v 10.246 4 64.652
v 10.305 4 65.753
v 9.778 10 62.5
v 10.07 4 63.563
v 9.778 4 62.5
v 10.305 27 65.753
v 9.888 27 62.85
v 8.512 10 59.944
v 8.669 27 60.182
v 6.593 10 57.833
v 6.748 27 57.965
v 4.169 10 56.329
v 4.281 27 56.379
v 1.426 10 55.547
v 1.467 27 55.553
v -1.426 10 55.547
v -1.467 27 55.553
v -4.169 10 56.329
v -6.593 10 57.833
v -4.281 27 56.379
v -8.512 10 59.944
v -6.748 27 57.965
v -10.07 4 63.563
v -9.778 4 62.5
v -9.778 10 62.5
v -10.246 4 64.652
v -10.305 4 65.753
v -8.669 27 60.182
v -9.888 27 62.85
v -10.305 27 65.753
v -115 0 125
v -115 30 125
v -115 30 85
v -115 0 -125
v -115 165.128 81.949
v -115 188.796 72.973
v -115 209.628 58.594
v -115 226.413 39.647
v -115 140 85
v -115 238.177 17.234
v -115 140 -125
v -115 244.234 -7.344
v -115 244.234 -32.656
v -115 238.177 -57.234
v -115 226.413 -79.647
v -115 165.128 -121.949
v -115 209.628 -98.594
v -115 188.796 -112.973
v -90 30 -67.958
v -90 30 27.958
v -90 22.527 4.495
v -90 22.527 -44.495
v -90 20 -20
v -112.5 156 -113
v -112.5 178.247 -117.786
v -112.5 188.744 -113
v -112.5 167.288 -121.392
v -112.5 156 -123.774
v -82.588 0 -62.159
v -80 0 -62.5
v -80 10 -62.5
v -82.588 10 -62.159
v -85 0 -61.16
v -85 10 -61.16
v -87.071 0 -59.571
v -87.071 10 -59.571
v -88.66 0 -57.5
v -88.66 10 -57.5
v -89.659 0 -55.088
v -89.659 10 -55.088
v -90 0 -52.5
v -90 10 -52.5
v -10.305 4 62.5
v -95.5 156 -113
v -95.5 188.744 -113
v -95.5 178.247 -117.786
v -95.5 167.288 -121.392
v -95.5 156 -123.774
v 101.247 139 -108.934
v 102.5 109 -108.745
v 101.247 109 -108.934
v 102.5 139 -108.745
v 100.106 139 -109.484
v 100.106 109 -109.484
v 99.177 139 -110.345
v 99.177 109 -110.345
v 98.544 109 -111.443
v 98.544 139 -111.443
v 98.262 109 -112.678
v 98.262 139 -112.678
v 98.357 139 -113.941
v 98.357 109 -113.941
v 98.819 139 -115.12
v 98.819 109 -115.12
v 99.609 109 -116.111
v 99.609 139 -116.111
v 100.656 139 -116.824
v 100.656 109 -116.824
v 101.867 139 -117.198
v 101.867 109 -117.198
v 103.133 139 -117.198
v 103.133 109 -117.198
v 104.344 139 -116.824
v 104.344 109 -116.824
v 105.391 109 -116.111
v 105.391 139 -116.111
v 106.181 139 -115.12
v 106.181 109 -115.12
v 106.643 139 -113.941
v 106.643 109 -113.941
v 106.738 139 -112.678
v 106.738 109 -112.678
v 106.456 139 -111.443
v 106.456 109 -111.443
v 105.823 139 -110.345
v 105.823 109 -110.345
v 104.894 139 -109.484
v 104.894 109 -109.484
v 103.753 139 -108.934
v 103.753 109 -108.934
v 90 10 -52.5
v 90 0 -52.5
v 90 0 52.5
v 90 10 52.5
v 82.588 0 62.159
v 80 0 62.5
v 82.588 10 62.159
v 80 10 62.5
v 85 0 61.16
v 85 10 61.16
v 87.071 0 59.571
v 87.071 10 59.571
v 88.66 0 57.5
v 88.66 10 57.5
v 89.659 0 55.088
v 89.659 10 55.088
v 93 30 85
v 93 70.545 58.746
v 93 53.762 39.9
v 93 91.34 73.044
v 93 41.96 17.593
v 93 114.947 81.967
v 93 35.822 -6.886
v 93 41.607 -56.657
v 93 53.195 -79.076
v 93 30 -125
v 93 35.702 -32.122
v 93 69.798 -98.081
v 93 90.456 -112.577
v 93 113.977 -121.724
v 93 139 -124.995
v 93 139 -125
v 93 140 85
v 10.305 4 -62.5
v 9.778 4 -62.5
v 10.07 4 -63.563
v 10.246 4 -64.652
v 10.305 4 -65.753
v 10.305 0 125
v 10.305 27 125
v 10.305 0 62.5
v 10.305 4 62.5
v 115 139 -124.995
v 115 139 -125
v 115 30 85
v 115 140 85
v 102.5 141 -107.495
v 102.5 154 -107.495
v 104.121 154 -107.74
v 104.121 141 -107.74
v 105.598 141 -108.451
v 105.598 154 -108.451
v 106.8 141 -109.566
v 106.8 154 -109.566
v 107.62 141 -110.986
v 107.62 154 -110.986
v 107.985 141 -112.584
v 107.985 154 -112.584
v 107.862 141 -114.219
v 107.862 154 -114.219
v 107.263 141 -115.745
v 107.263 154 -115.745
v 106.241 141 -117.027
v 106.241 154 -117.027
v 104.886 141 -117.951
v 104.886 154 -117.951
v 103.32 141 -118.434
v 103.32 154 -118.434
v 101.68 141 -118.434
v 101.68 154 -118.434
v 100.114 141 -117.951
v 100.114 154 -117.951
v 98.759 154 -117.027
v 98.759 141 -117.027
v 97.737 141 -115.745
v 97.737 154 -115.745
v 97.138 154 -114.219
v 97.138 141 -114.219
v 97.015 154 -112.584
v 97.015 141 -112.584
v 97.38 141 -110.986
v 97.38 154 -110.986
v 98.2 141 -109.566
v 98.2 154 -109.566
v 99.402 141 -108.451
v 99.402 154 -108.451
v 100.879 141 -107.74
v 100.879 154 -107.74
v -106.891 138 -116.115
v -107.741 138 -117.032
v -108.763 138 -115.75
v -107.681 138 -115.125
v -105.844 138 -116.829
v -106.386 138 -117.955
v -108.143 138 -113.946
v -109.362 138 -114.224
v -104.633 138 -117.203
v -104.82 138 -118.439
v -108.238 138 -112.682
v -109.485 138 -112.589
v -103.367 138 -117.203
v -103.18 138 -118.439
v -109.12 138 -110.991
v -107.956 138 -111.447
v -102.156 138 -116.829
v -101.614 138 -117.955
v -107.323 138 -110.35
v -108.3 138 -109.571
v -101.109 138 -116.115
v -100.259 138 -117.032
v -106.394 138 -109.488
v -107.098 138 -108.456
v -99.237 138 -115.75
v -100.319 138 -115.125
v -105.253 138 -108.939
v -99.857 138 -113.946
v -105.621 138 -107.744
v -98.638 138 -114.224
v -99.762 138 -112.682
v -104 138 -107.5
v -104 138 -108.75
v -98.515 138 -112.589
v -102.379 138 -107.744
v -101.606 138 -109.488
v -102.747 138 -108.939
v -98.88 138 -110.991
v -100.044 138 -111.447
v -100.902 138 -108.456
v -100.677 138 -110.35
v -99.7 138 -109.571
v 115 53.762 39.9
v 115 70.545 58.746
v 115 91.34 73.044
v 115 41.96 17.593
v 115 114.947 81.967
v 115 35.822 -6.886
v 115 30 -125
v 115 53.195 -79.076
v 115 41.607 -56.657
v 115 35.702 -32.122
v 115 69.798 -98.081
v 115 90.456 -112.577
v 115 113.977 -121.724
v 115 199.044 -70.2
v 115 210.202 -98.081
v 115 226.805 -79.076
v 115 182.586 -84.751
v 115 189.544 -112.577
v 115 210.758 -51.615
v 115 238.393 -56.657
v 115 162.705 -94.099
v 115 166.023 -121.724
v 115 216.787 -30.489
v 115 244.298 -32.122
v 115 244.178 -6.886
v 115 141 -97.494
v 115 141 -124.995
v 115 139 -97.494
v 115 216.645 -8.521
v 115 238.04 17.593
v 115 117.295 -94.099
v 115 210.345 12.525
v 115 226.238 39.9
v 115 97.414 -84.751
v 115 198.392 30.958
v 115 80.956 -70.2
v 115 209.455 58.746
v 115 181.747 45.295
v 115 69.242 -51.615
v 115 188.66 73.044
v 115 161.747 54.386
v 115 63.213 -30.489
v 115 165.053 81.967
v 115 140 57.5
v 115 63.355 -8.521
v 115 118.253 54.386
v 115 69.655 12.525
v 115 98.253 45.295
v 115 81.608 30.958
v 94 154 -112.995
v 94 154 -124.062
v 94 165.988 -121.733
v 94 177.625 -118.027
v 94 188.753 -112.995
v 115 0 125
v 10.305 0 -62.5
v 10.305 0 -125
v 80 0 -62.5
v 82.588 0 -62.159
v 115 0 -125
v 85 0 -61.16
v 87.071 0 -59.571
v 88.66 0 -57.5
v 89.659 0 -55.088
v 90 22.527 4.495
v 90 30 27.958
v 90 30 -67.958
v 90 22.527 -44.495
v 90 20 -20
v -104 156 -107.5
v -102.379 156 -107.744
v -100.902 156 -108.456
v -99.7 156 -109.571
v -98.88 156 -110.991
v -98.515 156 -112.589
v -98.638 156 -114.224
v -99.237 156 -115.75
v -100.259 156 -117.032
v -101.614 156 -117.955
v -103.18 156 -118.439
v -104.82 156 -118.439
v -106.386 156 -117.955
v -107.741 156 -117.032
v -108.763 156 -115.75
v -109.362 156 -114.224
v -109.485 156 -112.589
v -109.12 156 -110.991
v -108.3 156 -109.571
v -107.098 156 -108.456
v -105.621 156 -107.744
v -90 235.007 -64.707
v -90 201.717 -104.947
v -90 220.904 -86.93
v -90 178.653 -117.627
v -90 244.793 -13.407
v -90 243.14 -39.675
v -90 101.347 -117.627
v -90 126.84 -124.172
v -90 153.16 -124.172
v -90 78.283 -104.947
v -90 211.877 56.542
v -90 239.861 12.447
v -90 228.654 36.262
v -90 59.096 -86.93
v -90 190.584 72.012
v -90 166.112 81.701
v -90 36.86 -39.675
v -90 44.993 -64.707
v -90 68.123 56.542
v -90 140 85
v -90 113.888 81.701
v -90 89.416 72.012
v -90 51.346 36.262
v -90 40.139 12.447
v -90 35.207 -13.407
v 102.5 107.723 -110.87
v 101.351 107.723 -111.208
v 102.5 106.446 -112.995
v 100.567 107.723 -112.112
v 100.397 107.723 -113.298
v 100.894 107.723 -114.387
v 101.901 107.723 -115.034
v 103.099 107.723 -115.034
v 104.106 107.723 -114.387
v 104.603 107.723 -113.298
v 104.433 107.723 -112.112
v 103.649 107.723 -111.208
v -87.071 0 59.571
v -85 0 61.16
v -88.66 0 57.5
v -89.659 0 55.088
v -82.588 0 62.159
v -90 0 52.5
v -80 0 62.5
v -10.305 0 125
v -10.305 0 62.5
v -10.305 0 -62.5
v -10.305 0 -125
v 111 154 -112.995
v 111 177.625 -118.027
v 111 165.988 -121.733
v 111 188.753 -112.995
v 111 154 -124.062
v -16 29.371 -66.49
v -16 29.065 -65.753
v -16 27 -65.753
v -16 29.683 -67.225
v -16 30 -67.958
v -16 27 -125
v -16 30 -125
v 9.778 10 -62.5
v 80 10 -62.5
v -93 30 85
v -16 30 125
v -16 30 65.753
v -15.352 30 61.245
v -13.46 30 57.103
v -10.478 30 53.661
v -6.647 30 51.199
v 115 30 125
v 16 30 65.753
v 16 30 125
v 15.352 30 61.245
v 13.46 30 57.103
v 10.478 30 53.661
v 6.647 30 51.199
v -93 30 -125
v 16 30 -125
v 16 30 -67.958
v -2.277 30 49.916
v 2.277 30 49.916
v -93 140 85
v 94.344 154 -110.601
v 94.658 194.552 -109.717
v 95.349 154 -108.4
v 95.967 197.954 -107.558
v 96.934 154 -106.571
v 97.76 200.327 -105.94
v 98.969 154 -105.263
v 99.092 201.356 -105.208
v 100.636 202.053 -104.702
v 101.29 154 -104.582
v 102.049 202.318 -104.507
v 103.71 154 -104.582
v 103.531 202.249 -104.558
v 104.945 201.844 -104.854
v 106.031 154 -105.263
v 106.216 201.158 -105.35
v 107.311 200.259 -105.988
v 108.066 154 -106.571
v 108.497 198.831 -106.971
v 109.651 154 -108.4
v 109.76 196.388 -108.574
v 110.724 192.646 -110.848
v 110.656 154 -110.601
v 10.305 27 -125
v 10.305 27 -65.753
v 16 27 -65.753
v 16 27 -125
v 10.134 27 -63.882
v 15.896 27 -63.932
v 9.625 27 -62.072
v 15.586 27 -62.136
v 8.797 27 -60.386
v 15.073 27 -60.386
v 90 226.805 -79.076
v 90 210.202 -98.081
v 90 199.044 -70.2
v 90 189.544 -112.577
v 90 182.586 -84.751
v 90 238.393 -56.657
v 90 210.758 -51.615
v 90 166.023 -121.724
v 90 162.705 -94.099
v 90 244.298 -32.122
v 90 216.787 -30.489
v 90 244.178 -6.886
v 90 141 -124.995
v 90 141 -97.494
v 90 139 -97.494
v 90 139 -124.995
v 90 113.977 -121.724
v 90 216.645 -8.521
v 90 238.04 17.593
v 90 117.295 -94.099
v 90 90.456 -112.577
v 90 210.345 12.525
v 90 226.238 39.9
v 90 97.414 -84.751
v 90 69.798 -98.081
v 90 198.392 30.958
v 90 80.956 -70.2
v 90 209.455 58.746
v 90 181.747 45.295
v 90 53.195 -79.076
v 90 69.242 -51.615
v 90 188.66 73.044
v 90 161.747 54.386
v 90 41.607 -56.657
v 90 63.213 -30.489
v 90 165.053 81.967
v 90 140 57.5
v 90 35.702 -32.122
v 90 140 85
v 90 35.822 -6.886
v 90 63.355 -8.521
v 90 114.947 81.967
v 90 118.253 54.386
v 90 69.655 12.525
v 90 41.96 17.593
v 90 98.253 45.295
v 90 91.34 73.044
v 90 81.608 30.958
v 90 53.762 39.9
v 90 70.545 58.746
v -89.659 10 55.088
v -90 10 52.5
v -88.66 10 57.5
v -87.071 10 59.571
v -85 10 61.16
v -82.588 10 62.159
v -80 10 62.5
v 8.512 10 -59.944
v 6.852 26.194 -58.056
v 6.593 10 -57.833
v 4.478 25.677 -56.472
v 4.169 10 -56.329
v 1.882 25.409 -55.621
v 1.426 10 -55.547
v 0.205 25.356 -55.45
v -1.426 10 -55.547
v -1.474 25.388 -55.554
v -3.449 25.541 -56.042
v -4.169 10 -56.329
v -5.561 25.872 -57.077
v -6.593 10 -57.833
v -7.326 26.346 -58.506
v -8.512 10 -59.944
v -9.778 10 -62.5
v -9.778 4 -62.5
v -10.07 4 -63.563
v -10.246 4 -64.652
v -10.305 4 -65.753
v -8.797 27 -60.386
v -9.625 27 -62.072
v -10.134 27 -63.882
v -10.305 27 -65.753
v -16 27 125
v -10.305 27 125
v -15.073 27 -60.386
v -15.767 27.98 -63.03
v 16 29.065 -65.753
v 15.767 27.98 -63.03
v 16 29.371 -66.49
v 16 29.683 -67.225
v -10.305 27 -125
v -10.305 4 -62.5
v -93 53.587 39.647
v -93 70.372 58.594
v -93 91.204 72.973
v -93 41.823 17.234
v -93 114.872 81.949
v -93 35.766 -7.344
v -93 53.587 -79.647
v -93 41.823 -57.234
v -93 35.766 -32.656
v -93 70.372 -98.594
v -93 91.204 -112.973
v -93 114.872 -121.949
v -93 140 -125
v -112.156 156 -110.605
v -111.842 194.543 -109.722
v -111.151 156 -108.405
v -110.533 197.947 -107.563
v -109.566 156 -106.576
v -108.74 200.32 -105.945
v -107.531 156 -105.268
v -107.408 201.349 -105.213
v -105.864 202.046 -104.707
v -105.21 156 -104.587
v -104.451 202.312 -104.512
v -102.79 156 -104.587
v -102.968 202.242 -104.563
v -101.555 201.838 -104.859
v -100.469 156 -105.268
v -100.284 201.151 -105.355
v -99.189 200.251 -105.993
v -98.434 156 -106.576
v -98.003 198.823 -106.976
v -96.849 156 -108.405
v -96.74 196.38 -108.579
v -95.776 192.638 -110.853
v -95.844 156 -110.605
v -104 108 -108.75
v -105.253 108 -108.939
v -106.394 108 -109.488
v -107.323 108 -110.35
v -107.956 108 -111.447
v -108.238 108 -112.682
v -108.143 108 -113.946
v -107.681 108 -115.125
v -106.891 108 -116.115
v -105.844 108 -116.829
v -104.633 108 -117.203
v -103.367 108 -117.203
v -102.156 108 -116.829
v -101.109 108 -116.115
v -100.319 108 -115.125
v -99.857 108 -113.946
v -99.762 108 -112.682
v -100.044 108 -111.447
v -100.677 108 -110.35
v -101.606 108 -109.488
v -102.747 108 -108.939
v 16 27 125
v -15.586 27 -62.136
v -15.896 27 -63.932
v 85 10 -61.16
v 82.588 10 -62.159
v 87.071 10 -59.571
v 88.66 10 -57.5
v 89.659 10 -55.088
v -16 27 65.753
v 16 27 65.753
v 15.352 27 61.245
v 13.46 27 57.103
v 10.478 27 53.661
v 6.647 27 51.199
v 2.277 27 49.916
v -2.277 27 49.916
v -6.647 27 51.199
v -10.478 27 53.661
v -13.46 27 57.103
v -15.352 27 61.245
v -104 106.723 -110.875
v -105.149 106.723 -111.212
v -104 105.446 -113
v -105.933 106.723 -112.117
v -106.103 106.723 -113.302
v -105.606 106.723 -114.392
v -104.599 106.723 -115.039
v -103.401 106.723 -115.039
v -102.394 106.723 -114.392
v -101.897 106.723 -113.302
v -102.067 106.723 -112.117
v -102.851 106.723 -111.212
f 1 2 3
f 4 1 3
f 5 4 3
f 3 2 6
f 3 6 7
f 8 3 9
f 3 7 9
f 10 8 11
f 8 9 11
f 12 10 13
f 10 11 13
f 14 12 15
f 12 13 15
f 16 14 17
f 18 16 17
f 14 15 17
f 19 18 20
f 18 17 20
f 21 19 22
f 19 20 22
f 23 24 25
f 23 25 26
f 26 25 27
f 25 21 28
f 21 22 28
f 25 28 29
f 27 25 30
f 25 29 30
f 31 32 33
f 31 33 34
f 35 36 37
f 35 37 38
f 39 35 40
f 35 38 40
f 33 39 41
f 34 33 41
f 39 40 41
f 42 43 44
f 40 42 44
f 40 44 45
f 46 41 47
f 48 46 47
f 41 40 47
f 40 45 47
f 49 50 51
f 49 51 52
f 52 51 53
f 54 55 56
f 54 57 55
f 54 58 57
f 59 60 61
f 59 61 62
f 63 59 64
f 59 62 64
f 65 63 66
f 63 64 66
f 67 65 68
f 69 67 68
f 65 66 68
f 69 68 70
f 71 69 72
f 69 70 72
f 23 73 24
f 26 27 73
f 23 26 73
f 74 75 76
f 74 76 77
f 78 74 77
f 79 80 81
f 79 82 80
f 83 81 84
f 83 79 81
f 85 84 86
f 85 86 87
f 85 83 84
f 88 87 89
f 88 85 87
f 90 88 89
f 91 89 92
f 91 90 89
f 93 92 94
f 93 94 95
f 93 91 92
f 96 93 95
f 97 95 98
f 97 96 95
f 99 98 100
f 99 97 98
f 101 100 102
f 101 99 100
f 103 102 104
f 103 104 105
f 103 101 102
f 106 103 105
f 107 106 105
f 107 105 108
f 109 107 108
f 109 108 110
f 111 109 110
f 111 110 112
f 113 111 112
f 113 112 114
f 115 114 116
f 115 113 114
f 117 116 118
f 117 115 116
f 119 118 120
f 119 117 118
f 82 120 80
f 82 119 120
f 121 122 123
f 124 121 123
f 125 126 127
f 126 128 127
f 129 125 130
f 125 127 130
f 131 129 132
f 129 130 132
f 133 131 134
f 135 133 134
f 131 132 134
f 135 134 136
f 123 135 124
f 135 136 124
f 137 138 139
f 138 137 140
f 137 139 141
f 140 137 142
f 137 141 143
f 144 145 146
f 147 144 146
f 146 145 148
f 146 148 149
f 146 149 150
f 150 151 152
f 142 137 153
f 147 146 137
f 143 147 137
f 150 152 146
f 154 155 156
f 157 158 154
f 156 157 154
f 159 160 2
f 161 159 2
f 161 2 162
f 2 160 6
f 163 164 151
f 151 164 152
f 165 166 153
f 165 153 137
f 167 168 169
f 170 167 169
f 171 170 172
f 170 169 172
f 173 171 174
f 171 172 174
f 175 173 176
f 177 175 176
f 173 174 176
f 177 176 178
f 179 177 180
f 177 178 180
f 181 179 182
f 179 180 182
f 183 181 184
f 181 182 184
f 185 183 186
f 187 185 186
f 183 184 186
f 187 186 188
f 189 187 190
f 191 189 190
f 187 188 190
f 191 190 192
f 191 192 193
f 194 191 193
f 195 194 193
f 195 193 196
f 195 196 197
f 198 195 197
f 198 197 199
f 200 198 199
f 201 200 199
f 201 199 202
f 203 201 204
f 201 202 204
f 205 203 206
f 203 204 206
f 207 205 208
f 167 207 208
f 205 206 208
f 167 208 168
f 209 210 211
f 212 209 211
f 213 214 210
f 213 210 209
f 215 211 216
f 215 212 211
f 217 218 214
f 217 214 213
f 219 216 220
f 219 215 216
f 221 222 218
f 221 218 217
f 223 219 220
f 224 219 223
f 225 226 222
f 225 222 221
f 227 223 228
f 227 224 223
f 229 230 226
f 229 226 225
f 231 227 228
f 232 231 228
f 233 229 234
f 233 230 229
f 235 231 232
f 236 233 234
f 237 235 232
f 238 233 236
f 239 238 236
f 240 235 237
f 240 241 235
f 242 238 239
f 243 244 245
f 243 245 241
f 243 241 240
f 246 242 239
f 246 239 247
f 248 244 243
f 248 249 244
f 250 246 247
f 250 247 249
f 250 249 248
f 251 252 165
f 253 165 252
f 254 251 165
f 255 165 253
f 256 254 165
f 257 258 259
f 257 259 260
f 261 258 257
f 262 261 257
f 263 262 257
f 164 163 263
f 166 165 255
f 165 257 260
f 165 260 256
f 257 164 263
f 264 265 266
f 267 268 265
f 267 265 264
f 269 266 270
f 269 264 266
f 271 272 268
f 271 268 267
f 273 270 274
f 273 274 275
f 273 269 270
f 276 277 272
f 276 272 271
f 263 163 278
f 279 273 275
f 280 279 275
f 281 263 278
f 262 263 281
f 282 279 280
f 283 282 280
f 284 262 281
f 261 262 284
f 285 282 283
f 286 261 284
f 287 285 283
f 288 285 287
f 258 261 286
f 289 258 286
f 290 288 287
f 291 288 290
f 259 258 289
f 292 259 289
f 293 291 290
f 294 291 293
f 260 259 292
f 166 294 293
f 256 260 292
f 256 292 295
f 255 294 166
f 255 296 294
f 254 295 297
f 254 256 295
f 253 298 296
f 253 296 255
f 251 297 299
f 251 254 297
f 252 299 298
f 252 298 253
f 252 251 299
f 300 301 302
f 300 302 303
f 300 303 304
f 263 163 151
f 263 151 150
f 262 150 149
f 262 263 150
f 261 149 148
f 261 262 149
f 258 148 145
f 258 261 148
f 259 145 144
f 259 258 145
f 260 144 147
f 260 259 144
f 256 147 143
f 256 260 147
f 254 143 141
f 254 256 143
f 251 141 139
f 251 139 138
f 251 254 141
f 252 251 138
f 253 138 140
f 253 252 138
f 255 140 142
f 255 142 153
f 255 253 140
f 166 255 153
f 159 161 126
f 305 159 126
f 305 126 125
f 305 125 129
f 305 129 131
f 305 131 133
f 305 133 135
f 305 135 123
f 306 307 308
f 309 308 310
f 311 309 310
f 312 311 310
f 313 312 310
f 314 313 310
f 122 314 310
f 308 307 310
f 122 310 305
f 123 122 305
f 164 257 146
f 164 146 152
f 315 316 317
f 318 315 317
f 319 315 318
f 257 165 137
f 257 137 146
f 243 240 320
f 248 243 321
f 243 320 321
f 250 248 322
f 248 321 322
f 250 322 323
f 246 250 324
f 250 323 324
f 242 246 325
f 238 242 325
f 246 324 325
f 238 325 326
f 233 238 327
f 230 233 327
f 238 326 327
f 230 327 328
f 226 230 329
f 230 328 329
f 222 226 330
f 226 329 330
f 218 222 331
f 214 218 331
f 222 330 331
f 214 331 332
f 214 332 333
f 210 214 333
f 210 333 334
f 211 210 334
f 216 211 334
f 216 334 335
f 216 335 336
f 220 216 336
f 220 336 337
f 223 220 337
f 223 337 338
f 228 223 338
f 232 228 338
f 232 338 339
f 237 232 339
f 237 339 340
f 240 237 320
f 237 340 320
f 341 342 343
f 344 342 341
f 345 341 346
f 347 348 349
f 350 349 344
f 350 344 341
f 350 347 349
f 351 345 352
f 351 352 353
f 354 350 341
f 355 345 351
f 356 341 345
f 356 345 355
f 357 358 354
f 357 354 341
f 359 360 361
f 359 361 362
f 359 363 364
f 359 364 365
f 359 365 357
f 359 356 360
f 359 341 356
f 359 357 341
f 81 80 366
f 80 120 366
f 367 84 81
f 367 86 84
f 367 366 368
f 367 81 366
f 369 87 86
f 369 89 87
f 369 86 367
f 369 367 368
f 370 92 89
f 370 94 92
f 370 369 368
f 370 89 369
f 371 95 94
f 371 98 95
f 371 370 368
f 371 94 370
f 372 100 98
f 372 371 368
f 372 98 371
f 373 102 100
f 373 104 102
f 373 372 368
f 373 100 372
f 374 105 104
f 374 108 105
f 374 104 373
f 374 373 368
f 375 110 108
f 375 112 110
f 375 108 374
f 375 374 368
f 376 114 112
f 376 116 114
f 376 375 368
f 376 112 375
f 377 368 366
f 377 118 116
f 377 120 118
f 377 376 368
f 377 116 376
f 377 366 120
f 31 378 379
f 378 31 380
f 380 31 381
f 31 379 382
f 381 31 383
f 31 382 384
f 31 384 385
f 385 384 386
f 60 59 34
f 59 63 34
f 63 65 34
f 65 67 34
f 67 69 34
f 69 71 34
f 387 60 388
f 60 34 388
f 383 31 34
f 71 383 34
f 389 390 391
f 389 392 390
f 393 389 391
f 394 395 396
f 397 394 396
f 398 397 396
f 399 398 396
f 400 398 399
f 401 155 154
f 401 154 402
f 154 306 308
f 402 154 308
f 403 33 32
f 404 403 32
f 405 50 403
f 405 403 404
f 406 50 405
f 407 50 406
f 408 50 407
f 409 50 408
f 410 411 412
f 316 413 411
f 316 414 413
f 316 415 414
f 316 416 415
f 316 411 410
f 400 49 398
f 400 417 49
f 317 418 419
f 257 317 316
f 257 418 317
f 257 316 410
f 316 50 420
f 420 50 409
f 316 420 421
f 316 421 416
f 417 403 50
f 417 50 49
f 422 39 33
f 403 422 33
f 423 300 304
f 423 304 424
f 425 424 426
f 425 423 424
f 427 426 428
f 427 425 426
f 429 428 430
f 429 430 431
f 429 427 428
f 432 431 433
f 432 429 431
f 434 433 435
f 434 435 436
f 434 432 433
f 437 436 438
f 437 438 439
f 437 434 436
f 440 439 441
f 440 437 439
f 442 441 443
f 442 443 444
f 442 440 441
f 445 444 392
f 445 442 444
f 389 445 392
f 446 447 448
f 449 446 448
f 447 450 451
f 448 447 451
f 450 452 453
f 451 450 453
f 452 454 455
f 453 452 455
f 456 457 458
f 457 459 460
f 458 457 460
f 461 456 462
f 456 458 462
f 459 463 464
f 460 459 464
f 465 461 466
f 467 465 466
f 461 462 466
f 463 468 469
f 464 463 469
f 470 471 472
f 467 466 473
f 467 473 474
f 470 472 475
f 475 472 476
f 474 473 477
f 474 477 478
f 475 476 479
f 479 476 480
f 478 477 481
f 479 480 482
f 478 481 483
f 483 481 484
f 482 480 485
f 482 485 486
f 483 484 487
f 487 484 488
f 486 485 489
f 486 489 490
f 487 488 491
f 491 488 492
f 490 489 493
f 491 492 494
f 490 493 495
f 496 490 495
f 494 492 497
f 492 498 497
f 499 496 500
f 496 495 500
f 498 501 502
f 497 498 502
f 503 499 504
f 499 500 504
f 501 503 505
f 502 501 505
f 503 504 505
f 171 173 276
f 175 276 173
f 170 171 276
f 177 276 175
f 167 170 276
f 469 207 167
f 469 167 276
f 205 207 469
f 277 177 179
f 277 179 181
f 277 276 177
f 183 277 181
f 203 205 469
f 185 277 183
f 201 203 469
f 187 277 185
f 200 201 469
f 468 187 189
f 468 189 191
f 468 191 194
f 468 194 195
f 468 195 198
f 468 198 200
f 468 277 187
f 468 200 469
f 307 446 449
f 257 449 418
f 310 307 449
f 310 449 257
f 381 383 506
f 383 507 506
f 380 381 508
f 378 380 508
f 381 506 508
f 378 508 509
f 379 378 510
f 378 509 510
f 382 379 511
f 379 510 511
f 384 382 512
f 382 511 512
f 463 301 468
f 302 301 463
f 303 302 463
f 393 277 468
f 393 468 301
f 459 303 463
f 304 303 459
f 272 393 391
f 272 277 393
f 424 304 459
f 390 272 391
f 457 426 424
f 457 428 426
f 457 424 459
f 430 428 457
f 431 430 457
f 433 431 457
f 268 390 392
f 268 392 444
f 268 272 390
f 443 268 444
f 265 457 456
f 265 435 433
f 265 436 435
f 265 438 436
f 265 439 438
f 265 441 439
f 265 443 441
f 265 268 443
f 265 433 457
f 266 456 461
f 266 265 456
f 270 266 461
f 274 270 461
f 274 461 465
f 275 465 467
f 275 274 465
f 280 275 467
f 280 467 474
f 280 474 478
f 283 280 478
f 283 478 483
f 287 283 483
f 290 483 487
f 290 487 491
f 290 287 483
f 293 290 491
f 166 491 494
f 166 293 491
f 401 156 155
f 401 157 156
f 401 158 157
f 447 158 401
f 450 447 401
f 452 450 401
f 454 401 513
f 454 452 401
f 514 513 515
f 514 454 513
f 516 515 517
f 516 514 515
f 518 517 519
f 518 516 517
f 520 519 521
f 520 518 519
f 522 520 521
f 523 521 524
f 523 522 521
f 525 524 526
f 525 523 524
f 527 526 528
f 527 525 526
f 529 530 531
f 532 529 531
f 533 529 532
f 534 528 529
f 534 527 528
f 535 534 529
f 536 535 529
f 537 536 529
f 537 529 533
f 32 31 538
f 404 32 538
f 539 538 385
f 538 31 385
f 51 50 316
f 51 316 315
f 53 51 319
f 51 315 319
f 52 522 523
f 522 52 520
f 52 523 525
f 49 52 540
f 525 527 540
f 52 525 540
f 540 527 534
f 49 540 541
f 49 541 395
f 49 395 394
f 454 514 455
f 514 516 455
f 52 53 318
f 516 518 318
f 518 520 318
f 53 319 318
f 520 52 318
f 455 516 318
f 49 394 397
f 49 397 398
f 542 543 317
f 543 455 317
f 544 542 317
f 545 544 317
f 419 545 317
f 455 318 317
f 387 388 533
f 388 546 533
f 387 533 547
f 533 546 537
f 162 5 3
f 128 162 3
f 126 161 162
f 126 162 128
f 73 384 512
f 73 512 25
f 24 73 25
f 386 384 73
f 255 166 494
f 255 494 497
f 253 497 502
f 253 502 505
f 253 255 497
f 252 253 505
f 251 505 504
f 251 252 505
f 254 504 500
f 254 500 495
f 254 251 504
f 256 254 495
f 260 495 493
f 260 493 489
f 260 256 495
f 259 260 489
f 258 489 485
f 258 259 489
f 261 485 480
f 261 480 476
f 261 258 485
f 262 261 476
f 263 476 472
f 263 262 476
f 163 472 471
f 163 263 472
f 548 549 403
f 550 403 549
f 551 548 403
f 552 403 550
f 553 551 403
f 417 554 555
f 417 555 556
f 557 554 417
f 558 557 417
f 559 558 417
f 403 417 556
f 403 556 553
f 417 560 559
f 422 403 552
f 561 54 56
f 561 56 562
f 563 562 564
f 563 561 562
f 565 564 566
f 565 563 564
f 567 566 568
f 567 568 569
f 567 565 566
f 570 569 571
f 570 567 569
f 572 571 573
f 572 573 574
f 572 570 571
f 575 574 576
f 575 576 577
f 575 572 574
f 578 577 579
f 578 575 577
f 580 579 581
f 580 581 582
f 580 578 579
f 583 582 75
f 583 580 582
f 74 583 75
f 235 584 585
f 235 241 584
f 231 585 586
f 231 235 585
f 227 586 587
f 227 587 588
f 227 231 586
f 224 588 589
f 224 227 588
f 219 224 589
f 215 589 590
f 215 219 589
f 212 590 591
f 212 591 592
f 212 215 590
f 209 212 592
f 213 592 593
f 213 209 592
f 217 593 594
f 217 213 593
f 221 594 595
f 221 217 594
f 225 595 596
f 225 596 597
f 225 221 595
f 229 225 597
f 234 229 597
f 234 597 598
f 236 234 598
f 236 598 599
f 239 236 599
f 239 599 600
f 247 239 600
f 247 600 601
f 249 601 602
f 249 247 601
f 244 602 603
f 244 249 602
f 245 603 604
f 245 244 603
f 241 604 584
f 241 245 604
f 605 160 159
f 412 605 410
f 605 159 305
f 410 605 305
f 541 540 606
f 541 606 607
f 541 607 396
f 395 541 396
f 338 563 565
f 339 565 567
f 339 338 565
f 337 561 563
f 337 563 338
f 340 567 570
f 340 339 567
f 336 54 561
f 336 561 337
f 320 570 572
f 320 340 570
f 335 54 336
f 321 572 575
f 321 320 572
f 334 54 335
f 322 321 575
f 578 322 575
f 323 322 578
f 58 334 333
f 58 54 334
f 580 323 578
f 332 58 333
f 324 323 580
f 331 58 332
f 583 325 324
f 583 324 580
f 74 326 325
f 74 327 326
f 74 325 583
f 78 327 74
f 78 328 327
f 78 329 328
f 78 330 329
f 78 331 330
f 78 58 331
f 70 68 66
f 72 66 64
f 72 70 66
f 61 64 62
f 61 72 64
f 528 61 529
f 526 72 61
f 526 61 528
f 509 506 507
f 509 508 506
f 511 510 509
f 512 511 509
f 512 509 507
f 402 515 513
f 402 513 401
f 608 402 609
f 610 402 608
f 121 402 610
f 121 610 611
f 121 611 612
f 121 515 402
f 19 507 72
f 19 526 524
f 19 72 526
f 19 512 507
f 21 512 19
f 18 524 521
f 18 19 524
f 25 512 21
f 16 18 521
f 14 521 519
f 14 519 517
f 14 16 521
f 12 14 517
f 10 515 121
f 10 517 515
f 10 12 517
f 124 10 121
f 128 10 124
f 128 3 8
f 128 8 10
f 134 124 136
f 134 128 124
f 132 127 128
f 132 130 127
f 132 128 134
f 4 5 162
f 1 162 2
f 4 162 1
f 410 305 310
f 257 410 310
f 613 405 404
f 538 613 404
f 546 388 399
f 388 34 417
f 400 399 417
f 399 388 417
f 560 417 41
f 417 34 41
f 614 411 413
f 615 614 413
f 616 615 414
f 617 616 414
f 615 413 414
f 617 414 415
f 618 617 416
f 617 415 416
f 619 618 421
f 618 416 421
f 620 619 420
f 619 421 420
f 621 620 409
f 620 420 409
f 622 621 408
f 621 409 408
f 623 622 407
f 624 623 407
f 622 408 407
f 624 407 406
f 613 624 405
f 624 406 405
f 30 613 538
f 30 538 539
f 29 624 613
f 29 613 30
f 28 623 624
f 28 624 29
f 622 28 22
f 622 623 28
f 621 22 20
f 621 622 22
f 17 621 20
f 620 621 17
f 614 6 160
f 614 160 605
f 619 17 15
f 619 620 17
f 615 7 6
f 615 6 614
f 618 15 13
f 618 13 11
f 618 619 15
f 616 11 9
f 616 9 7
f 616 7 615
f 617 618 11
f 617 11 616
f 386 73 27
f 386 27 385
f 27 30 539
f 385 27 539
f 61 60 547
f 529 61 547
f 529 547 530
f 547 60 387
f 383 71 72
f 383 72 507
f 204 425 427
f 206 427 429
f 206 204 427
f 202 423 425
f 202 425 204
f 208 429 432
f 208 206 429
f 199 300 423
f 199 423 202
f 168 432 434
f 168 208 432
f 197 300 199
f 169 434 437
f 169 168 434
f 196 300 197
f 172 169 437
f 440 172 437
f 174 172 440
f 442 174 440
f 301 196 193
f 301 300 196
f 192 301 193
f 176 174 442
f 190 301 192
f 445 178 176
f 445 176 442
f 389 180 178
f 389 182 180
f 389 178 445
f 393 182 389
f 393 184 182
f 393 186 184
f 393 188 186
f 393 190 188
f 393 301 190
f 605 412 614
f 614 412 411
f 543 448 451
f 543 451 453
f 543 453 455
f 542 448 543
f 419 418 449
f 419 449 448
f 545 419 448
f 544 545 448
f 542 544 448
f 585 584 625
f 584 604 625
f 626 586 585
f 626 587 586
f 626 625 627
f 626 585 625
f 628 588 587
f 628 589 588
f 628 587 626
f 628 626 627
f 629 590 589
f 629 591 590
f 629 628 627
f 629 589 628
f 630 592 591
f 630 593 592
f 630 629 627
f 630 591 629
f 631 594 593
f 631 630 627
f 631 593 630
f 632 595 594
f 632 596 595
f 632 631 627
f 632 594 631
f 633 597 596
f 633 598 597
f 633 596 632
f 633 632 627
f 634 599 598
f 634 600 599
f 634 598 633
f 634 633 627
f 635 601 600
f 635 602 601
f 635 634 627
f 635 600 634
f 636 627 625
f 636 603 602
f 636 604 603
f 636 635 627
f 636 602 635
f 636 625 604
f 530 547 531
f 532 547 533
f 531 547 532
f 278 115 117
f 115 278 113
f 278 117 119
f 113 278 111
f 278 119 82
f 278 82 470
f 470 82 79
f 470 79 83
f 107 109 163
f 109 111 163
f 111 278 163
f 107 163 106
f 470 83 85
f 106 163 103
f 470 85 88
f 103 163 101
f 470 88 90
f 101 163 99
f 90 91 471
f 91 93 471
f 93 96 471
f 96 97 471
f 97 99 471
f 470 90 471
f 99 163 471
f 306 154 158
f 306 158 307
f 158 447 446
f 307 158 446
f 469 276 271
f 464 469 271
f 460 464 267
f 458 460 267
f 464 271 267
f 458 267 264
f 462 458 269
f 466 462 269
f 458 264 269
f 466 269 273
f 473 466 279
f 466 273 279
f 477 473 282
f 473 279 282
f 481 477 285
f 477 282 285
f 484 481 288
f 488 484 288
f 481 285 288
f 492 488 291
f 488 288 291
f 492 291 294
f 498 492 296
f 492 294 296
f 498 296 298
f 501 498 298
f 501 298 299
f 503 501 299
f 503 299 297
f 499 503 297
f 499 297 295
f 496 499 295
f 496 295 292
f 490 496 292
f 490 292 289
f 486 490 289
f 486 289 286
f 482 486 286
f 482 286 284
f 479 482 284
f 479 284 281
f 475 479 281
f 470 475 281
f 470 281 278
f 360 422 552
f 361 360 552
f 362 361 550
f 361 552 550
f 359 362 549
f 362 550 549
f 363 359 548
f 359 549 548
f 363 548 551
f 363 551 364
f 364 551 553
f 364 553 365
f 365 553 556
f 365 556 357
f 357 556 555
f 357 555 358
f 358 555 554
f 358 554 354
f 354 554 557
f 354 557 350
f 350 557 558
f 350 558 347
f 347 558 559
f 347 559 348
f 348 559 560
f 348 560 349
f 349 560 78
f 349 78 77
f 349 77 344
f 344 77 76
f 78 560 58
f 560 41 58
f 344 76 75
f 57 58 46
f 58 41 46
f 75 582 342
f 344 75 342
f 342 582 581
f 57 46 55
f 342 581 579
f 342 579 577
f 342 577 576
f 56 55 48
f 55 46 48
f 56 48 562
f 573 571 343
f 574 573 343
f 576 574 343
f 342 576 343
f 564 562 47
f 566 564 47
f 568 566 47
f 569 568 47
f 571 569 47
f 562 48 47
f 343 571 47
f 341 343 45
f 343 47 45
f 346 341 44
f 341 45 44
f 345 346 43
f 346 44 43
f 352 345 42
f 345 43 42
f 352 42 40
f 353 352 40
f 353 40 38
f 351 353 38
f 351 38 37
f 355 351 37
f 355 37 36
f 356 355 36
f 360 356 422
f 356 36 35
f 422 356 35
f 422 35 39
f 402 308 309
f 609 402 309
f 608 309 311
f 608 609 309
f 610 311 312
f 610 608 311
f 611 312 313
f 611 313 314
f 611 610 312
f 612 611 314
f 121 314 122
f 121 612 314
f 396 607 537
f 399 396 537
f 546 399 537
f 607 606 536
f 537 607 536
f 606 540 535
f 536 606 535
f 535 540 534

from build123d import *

# Parameters (mm, degrees)
SKETCH_3_W           = 230
SKETCH_3_H           = 250
EXTRUDE_1_DEPTH      = 30
CUT_EXTRUDE_1_DEPTH  = 30
CUT_EXTRUDE_2_DEPTH  = 3
CUT_EXTRUDE_START    = -30
SKETCH_5_W           = 20.61
SKETCH_5_H           = 131.50590542
CUT_EXTRUDE_3_DEPTH  = 4
EXTRUDE_START        = 115
SKETCH_6_R           = 105
EXTRUDE_2_DEPTH      = 25
EXTRUDE_START_2      = -115
SKETCH_6_5_R         = 105
EXTRUDE_3_DEPTH      = 25
EXTRUDE_4_DEPTH      = 22
EXTRUDE_5_DEPTH      = 22
SKETCH_10_R          = 120
CUT_EXTRUDE_10_DEPTH = 90
SKETCH_11_R          = 77.5
CUT_EXTRUDE_11_DEPTH = 25
SKETCH_12_W          = 57.586141253
SKETCH_12_H          = 168.151532458
CUT_EXTRUDE_12_DEPTH = 1
CUT_EXTRUDE_START_2  = 156
SKETCH_13_R          = 8.5
CUT_EXTRUDE_13_DEPTH = 143.119103715
SKETCH_14_R          = 5.5
CUT_EXTRUDE_14_DEPTH = 18
CUT_EXTRUDE_START_3  = 154
SKETCH_15_R          = 8.5
CUT_EXTRUDE_15_DEPTH = 145.119103878
SKETCH_16_R          = 5.5
CUT_EXTRUDE_16_DEPTH = 13
SKETCH_21_W          = 180
SKETCH_21_H          = 125
CUT_EXTRUDE_17_DEPTH = 10
FILLET_1_R           = 10


with BuildPart() as part:
    # 草图3 → 凸台-拉伸1 (new body)
    with BuildSketch(Plane(origin=(0, 0, 0), x_dir=(1, 0, 0), z_dir=(0, 1, 0))):
        Rectangle(SKETCH_3_W, SKETCH_3_H)
    extrude(amount=EXTRUDE_1_DEPTH)

    # 草图4 → 切除-拉伸1 (cut)
    with BuildSketch(Plane(origin=(0, 30, 0), x_dir=(1, 0, 0), z_dir=(0, 1, 0))):
        with BuildLine():
            Line((-10.305, -65.75295271), (-10.305, -125))
            Line((-10.305, -125), (10.305, -125))
            Line((10.305, -125), (10.305, -65.75295271))
            ThreePointArc((10.305, -65.75295271), (0, -55.44795271), (-10.305, -65.75295271))
        make_face()
    cut_extrude_1 = extrude(amount=-CUT_EXTRUDE_1_DEPTH, mode=Mode.SUBTRACT)

    # 草图4<3> → 切除-拉伸2 (cut)
    with BuildSketch(Plane(origin=(0, 30, 0), x_dir=(1, 0, 0), z_dir=(0, 1, 0))):
        with BuildLine():
            ThreePointArc((16, -65.75295271), (0, -49.75295271), (-16, -65.75295271))
            Line((-16, -65.75295271), (-16, -125))
            Line((-16, -125), (-10.305, -125))
            Line((-10.305, -125), (-10.305, -65.75295271))
            ThreePointArc((-10.305, -65.75295271), (0, -55.44795271), (10.305, -65.75295271))
            Line((10.305, -65.75295271), (10.305, -125))
            Line((10.305, -125), (16, -125))
            Line((16, -125), (16, -65.75295271))
        make_face()
    cut_extrude_2 = extrude(amount=-CUT_EXTRUDE_2_DEPTH, mode=Mode.SUBTRACT)

    # 镜向1: 切除-拉伸1, 切除-拉伸2 across plane
    add(cut_extrude_1.mirror(Plane.XY), mode=Mode.SUBTRACT)
    add(cut_extrude_2.mirror(Plane.XY), mode=Mode.SUBTRACT)

    # 草图5 → 切除-拉伸3 (cut)
    with BuildSketch(Plane(origin=(0, 30, 0), x_dir=(1, 0, 0), z_dir=(0, 1, 0)).offset(CUT_EXTRUDE_START)):
        Rectangle(SKETCH_5_W, SKETCH_5_H)
    extrude(amount=CUT_EXTRUDE_3_DEPTH, mode=Mode.SUBTRACT)



with BuildPart() as body_2:
    # 草图6 → 凸台-拉伸2 (new body)
    with BuildSketch(Plane(origin=(0, 0, 0), x_dir=(0, 0, -1), z_dir=(1, 0, 0)).offset(EXTRUDE_START)):
        with Locations(Location((20, 140, 0), (0, 0, 180))):
            Circle(SKETCH_6_R)
    extrude(amount=-EXTRUDE_2_DEPTH)

    # 草图11 → 切除-拉伸11 (cut)
    with BuildSketch(Plane(origin=(115, 0, 0), x_dir=(0, 0, -1), z_dir=(1, 0, 0))):
        with Locations((20, 140)):
            Circle(SKETCH_11_R)
    extrude(amount=-CUT_EXTRUDE_11_DEPTH, mode=Mode.SUBTRACT)


with BuildPart() as body_3:
    # 草图6<5> → 凸台-拉伸3 (new body)
    with BuildSketch(Plane(origin=(0, 0, 0), x_dir=(0, 0, -1), z_dir=(1, 0, 0)).offset(EXTRUDE_START_2)):
        with Locations(Location((20, 140, 0), (0, 0, 180))):
            Circle(SKETCH_6_5_R)
    extrude(amount=EXTRUDE_3_DEPTH)


with BuildPart() as body_4:
    # 草图6<8> → 凸台-拉伸4 (new body)
    with BuildSketch(Plane(origin=(0, 0, 0), x_dir=(0, 0, -1), z_dir=(1, 0, 0)).offset(EXTRUDE_START)):
        with BuildLine():
            Line((-85, 30), (125, 30))
            Line((125, 30), (125, 140))
            ThreePointArc((125, 140), (20, 35), (-85, 140))
            Line((-85, 140), (-85, 30))
        make_face()
    extrude(amount=-EXTRUDE_4_DEPTH)


with BuildPart() as part_1:
    add(part.part)

    add(body_3.part)  # 凸台-拉伸5 merges body 3
    # 草图6<10> → 凸台-拉伸5 (add)
    with BuildSketch(Plane(origin=(0, 0, 0), x_dir=(0, 0, -1), z_dir=(1, 0, 0)).offset(EXTRUDE_START_2)):
        with BuildLine():
            Line((-85, 30), (125, 30))
            Line((125, 30), (125, 140))
            ThreePointArc((125, 140), (20, 35), (-85, 140))
            Line((-85, 140), (-85, 30))
        make_face()
    extrude(amount=EXTRUDE_5_DEPTH)

    # 草图10 → 切除-拉伸10 (cut, symmetric)
    with BuildSketch(Plane(origin=(0, 0, 0), x_dir=(0, 0, -1), z_dir=(1, 0, 0))):
        with Locations((20, 140)):
            Circle(SKETCH_10_R)
    extrude(amount=CUT_EXTRUDE_10_DEPTH, both=True, mode=Mode.SUBTRACT)

    # 草图13 → 切除-拉伸13 (cut, through all)
    with BuildSketch(Plane(origin=(0, 0, 0), x_dir=(1, 0, 0), z_dir=(0, 1, 0)).offset(CUT_EXTRUDE_START_2)):
        with BuildLine():
            Line((-112.5, 138.339436781), (-112.5, 113))
            ThreePointArc((-112.5, 113), (-104, 121.5), (-95.5, 113))
            Line((-95.5, 113), (-95.5, 138.339436781))
            Line((-95.5, 138.339436781), (-112.5, 138.339436781))
        make_face()
        with Locations((-104, 113)):
            Circle(SKETCH_13_R)
    extrude(amount=CUT_EXTRUDE_13_DEPTH, mode=Mode.SUBTRACT)

    # 草图14 → 切除-拉伸14 (cut)
    with BuildSketch(Plane(origin=(0, 156, 0), x_dir=(1, 0, 0), z_dir=(0, 1, 0))):
        with Locations(Location((-104, 113, 0), (0, 0, 270))):
            Circle(SKETCH_14_R)
    extrude(amount=-CUT_EXTRUDE_14_DEPTH, mode=Mode.SUBTRACT)

    # 草图18 → M10 螺纹孔1 (revolve, cut)
    with BuildSketch(Plane(origin=(-104, 138, -113), x_dir=(0, 0, 1), z_dir=(1, 0, 0))):
        Polygon((0, 0), (0, 32.553657631), (4.25, 30), (4.25, 0), align=None)
    revolve(axis=Axis((-104, 144.35, -113), (0, -1, 0)), mode=Mode.SUBTRACT)

    # 草图21 → 切除-拉伸17 (cut)
    with BuildSketch(Plane.XZ):
        Rectangle(SKETCH_21_W, SKETCH_21_H)
    extrude(amount=-CUT_EXTRUDE_17_DEPTH, mode=Mode.SUBTRACT)

    # 圆角1
    fillet_1_edges = [part_1.edges().sort_by_distance(p)[0] for p in [
        (-90, 5, 62.5),
        (90, 5, -62.5),
        (-90, 5, -62.5),
        (90, 5, 62.5),
    ]]
    fillet(fillet_1_edges, radius=FILLET_1_R)


with BuildPart() as cut_extrude_12_tool:
    # 草图12 → 切除-拉伸12 (new, symmetric)
    with BuildSketch(Plane(origin=(0, 140, 0), x_dir=(-1, 0, 0), z_dir=(0, -1, 0))):
        with Locations((-101.857491759, 81.196459166)):
            Rectangle(SKETCH_12_W, SKETCH_12_H)
    extrude(amount=CUT_EXTRUDE_12_DEPTH, both=True)


with BuildPart() as body_2_1:
    add(body_2.part)

    # 切除-拉伸12: cut by cut_extrude_12_tool
    add(cut_extrude_12_tool.part, mode=Mode.SUBTRACT)

    # 草图15 → 切除-拉伸15 (cut, through all)
    with BuildSketch(Plane(origin=(0, 0, 0), x_dir=(1, 0, 0), z_dir=(0, 1, 0)).offset(CUT_EXTRUDE_START_3)):
        with Locations((102.5, 112.995237987)):
            Circle(SKETCH_15_R)
        with BuildLine():
            Line((94, 134.956488476), (94, 112.995237987))
            ThreePointArc((94, 112.995237987), (102.5, 121.495237987), (111, 112.995237987))
            Line((111, 112.995237987), (111, 134.956488476))
            Line((111, 134.956488476), (94, 134.956488476))
        make_face()
    extrude(amount=CUT_EXTRUDE_15_DEPTH, mode=Mode.SUBTRACT)

    # 草图16 → 切除-拉伸16 (cut)
    with BuildSketch(Plane(origin=(0, 154, 0), x_dir=(1, 0, 0), z_dir=(0, 1, 0))):
        with Locations(Location((102.5, 112.995237987, 0), (0, 0, 270))):
            Circle(SKETCH_16_R)
    extrude(amount=-CUT_EXTRUDE_16_DEPTH, mode=Mode.SUBTRACT)

    # 草图20 → M10 螺纹孔2 (revolve, cut)
    with BuildSketch(Plane(origin=(102.5, 139, -112.995237987), x_dir=(0, 0, 1), z_dir=(1, 0, 0))):
        Polygon((0, 0), (0, 32.553657631), (4.25, 30), (4.25, 0), align=None)
    revolve(axis=Axis((102.5, 145.35, -112.995237987), (0, -1, 0)), mode=Mode.SUBTRACT)


with BuildPart() as body_4_1:
    add(body_4.part)

    # 切除-拉伸12: cut by cut_extrude_12_tool
    add(cut_extrude_12_tool.part, mode=Mode.SUBTRACT)


solid = Compound([part_1.part, body_2_1.part, body_4_1.part])
